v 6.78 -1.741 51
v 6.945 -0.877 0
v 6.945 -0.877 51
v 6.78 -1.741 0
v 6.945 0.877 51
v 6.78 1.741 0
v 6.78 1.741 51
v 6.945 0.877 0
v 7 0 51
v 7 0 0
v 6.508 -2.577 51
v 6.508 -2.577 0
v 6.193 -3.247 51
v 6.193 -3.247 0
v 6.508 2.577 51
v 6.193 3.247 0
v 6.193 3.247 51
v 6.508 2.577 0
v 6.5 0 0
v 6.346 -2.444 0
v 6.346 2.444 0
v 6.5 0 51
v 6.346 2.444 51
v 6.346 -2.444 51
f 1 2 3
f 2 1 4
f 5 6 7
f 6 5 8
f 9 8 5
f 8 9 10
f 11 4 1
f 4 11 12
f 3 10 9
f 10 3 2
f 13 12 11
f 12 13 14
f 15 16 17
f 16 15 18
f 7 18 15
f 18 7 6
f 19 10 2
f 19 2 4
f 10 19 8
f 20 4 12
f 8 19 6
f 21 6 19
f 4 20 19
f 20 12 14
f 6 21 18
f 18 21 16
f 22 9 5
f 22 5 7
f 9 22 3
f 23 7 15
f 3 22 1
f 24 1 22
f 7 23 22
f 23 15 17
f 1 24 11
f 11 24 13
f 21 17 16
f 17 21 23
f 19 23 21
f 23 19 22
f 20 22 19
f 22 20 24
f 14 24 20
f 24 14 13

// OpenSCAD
$fn = 50;


difference() {
	union() {
		cylinder(h = 51, r = 7.0000000000);
		translate(v = [-16.0000000000, 0, 0]) {
			cylinder(h = 51, r = 7.0000000000);
		}
	}
	union() {
		cylinder(h = 51, r = 3.2500000000);
		cylinder(h = 51, r = 1.8000000000);
		cylinder(h = 51, r = 1.8000000000);
		cylinder(h = 51, r = 1.8000000000);
		translate(v = [-20.5000000000, 0, 0]) {
			hull() {
				translate(v = [-3.7500000000, 0.0000000000, 0]) {
					cylinder(h = 51, r = 10.5000000000);
				}
				translate(v = [3.7500000000, 0.0000000000, 0]) {
					cylinder(h = 51, r = 10.5000000000);
				}
				translate(v = [-3.7500000000, -0.0000000000, 0]) {
					cylinder(h = 51, r = 10.5000000000);
				}
				translate(v = [3.7500000000, -0.0000000000, 0]) {
					cylinder(h = 51, r = 10.5000000000);
				}
			}
		}
		translate(v = [-13.0000000000, 0, 0.0000000000]) {
			cylinder(h = 51, r = 19.5000000000);
		}
	}
}
